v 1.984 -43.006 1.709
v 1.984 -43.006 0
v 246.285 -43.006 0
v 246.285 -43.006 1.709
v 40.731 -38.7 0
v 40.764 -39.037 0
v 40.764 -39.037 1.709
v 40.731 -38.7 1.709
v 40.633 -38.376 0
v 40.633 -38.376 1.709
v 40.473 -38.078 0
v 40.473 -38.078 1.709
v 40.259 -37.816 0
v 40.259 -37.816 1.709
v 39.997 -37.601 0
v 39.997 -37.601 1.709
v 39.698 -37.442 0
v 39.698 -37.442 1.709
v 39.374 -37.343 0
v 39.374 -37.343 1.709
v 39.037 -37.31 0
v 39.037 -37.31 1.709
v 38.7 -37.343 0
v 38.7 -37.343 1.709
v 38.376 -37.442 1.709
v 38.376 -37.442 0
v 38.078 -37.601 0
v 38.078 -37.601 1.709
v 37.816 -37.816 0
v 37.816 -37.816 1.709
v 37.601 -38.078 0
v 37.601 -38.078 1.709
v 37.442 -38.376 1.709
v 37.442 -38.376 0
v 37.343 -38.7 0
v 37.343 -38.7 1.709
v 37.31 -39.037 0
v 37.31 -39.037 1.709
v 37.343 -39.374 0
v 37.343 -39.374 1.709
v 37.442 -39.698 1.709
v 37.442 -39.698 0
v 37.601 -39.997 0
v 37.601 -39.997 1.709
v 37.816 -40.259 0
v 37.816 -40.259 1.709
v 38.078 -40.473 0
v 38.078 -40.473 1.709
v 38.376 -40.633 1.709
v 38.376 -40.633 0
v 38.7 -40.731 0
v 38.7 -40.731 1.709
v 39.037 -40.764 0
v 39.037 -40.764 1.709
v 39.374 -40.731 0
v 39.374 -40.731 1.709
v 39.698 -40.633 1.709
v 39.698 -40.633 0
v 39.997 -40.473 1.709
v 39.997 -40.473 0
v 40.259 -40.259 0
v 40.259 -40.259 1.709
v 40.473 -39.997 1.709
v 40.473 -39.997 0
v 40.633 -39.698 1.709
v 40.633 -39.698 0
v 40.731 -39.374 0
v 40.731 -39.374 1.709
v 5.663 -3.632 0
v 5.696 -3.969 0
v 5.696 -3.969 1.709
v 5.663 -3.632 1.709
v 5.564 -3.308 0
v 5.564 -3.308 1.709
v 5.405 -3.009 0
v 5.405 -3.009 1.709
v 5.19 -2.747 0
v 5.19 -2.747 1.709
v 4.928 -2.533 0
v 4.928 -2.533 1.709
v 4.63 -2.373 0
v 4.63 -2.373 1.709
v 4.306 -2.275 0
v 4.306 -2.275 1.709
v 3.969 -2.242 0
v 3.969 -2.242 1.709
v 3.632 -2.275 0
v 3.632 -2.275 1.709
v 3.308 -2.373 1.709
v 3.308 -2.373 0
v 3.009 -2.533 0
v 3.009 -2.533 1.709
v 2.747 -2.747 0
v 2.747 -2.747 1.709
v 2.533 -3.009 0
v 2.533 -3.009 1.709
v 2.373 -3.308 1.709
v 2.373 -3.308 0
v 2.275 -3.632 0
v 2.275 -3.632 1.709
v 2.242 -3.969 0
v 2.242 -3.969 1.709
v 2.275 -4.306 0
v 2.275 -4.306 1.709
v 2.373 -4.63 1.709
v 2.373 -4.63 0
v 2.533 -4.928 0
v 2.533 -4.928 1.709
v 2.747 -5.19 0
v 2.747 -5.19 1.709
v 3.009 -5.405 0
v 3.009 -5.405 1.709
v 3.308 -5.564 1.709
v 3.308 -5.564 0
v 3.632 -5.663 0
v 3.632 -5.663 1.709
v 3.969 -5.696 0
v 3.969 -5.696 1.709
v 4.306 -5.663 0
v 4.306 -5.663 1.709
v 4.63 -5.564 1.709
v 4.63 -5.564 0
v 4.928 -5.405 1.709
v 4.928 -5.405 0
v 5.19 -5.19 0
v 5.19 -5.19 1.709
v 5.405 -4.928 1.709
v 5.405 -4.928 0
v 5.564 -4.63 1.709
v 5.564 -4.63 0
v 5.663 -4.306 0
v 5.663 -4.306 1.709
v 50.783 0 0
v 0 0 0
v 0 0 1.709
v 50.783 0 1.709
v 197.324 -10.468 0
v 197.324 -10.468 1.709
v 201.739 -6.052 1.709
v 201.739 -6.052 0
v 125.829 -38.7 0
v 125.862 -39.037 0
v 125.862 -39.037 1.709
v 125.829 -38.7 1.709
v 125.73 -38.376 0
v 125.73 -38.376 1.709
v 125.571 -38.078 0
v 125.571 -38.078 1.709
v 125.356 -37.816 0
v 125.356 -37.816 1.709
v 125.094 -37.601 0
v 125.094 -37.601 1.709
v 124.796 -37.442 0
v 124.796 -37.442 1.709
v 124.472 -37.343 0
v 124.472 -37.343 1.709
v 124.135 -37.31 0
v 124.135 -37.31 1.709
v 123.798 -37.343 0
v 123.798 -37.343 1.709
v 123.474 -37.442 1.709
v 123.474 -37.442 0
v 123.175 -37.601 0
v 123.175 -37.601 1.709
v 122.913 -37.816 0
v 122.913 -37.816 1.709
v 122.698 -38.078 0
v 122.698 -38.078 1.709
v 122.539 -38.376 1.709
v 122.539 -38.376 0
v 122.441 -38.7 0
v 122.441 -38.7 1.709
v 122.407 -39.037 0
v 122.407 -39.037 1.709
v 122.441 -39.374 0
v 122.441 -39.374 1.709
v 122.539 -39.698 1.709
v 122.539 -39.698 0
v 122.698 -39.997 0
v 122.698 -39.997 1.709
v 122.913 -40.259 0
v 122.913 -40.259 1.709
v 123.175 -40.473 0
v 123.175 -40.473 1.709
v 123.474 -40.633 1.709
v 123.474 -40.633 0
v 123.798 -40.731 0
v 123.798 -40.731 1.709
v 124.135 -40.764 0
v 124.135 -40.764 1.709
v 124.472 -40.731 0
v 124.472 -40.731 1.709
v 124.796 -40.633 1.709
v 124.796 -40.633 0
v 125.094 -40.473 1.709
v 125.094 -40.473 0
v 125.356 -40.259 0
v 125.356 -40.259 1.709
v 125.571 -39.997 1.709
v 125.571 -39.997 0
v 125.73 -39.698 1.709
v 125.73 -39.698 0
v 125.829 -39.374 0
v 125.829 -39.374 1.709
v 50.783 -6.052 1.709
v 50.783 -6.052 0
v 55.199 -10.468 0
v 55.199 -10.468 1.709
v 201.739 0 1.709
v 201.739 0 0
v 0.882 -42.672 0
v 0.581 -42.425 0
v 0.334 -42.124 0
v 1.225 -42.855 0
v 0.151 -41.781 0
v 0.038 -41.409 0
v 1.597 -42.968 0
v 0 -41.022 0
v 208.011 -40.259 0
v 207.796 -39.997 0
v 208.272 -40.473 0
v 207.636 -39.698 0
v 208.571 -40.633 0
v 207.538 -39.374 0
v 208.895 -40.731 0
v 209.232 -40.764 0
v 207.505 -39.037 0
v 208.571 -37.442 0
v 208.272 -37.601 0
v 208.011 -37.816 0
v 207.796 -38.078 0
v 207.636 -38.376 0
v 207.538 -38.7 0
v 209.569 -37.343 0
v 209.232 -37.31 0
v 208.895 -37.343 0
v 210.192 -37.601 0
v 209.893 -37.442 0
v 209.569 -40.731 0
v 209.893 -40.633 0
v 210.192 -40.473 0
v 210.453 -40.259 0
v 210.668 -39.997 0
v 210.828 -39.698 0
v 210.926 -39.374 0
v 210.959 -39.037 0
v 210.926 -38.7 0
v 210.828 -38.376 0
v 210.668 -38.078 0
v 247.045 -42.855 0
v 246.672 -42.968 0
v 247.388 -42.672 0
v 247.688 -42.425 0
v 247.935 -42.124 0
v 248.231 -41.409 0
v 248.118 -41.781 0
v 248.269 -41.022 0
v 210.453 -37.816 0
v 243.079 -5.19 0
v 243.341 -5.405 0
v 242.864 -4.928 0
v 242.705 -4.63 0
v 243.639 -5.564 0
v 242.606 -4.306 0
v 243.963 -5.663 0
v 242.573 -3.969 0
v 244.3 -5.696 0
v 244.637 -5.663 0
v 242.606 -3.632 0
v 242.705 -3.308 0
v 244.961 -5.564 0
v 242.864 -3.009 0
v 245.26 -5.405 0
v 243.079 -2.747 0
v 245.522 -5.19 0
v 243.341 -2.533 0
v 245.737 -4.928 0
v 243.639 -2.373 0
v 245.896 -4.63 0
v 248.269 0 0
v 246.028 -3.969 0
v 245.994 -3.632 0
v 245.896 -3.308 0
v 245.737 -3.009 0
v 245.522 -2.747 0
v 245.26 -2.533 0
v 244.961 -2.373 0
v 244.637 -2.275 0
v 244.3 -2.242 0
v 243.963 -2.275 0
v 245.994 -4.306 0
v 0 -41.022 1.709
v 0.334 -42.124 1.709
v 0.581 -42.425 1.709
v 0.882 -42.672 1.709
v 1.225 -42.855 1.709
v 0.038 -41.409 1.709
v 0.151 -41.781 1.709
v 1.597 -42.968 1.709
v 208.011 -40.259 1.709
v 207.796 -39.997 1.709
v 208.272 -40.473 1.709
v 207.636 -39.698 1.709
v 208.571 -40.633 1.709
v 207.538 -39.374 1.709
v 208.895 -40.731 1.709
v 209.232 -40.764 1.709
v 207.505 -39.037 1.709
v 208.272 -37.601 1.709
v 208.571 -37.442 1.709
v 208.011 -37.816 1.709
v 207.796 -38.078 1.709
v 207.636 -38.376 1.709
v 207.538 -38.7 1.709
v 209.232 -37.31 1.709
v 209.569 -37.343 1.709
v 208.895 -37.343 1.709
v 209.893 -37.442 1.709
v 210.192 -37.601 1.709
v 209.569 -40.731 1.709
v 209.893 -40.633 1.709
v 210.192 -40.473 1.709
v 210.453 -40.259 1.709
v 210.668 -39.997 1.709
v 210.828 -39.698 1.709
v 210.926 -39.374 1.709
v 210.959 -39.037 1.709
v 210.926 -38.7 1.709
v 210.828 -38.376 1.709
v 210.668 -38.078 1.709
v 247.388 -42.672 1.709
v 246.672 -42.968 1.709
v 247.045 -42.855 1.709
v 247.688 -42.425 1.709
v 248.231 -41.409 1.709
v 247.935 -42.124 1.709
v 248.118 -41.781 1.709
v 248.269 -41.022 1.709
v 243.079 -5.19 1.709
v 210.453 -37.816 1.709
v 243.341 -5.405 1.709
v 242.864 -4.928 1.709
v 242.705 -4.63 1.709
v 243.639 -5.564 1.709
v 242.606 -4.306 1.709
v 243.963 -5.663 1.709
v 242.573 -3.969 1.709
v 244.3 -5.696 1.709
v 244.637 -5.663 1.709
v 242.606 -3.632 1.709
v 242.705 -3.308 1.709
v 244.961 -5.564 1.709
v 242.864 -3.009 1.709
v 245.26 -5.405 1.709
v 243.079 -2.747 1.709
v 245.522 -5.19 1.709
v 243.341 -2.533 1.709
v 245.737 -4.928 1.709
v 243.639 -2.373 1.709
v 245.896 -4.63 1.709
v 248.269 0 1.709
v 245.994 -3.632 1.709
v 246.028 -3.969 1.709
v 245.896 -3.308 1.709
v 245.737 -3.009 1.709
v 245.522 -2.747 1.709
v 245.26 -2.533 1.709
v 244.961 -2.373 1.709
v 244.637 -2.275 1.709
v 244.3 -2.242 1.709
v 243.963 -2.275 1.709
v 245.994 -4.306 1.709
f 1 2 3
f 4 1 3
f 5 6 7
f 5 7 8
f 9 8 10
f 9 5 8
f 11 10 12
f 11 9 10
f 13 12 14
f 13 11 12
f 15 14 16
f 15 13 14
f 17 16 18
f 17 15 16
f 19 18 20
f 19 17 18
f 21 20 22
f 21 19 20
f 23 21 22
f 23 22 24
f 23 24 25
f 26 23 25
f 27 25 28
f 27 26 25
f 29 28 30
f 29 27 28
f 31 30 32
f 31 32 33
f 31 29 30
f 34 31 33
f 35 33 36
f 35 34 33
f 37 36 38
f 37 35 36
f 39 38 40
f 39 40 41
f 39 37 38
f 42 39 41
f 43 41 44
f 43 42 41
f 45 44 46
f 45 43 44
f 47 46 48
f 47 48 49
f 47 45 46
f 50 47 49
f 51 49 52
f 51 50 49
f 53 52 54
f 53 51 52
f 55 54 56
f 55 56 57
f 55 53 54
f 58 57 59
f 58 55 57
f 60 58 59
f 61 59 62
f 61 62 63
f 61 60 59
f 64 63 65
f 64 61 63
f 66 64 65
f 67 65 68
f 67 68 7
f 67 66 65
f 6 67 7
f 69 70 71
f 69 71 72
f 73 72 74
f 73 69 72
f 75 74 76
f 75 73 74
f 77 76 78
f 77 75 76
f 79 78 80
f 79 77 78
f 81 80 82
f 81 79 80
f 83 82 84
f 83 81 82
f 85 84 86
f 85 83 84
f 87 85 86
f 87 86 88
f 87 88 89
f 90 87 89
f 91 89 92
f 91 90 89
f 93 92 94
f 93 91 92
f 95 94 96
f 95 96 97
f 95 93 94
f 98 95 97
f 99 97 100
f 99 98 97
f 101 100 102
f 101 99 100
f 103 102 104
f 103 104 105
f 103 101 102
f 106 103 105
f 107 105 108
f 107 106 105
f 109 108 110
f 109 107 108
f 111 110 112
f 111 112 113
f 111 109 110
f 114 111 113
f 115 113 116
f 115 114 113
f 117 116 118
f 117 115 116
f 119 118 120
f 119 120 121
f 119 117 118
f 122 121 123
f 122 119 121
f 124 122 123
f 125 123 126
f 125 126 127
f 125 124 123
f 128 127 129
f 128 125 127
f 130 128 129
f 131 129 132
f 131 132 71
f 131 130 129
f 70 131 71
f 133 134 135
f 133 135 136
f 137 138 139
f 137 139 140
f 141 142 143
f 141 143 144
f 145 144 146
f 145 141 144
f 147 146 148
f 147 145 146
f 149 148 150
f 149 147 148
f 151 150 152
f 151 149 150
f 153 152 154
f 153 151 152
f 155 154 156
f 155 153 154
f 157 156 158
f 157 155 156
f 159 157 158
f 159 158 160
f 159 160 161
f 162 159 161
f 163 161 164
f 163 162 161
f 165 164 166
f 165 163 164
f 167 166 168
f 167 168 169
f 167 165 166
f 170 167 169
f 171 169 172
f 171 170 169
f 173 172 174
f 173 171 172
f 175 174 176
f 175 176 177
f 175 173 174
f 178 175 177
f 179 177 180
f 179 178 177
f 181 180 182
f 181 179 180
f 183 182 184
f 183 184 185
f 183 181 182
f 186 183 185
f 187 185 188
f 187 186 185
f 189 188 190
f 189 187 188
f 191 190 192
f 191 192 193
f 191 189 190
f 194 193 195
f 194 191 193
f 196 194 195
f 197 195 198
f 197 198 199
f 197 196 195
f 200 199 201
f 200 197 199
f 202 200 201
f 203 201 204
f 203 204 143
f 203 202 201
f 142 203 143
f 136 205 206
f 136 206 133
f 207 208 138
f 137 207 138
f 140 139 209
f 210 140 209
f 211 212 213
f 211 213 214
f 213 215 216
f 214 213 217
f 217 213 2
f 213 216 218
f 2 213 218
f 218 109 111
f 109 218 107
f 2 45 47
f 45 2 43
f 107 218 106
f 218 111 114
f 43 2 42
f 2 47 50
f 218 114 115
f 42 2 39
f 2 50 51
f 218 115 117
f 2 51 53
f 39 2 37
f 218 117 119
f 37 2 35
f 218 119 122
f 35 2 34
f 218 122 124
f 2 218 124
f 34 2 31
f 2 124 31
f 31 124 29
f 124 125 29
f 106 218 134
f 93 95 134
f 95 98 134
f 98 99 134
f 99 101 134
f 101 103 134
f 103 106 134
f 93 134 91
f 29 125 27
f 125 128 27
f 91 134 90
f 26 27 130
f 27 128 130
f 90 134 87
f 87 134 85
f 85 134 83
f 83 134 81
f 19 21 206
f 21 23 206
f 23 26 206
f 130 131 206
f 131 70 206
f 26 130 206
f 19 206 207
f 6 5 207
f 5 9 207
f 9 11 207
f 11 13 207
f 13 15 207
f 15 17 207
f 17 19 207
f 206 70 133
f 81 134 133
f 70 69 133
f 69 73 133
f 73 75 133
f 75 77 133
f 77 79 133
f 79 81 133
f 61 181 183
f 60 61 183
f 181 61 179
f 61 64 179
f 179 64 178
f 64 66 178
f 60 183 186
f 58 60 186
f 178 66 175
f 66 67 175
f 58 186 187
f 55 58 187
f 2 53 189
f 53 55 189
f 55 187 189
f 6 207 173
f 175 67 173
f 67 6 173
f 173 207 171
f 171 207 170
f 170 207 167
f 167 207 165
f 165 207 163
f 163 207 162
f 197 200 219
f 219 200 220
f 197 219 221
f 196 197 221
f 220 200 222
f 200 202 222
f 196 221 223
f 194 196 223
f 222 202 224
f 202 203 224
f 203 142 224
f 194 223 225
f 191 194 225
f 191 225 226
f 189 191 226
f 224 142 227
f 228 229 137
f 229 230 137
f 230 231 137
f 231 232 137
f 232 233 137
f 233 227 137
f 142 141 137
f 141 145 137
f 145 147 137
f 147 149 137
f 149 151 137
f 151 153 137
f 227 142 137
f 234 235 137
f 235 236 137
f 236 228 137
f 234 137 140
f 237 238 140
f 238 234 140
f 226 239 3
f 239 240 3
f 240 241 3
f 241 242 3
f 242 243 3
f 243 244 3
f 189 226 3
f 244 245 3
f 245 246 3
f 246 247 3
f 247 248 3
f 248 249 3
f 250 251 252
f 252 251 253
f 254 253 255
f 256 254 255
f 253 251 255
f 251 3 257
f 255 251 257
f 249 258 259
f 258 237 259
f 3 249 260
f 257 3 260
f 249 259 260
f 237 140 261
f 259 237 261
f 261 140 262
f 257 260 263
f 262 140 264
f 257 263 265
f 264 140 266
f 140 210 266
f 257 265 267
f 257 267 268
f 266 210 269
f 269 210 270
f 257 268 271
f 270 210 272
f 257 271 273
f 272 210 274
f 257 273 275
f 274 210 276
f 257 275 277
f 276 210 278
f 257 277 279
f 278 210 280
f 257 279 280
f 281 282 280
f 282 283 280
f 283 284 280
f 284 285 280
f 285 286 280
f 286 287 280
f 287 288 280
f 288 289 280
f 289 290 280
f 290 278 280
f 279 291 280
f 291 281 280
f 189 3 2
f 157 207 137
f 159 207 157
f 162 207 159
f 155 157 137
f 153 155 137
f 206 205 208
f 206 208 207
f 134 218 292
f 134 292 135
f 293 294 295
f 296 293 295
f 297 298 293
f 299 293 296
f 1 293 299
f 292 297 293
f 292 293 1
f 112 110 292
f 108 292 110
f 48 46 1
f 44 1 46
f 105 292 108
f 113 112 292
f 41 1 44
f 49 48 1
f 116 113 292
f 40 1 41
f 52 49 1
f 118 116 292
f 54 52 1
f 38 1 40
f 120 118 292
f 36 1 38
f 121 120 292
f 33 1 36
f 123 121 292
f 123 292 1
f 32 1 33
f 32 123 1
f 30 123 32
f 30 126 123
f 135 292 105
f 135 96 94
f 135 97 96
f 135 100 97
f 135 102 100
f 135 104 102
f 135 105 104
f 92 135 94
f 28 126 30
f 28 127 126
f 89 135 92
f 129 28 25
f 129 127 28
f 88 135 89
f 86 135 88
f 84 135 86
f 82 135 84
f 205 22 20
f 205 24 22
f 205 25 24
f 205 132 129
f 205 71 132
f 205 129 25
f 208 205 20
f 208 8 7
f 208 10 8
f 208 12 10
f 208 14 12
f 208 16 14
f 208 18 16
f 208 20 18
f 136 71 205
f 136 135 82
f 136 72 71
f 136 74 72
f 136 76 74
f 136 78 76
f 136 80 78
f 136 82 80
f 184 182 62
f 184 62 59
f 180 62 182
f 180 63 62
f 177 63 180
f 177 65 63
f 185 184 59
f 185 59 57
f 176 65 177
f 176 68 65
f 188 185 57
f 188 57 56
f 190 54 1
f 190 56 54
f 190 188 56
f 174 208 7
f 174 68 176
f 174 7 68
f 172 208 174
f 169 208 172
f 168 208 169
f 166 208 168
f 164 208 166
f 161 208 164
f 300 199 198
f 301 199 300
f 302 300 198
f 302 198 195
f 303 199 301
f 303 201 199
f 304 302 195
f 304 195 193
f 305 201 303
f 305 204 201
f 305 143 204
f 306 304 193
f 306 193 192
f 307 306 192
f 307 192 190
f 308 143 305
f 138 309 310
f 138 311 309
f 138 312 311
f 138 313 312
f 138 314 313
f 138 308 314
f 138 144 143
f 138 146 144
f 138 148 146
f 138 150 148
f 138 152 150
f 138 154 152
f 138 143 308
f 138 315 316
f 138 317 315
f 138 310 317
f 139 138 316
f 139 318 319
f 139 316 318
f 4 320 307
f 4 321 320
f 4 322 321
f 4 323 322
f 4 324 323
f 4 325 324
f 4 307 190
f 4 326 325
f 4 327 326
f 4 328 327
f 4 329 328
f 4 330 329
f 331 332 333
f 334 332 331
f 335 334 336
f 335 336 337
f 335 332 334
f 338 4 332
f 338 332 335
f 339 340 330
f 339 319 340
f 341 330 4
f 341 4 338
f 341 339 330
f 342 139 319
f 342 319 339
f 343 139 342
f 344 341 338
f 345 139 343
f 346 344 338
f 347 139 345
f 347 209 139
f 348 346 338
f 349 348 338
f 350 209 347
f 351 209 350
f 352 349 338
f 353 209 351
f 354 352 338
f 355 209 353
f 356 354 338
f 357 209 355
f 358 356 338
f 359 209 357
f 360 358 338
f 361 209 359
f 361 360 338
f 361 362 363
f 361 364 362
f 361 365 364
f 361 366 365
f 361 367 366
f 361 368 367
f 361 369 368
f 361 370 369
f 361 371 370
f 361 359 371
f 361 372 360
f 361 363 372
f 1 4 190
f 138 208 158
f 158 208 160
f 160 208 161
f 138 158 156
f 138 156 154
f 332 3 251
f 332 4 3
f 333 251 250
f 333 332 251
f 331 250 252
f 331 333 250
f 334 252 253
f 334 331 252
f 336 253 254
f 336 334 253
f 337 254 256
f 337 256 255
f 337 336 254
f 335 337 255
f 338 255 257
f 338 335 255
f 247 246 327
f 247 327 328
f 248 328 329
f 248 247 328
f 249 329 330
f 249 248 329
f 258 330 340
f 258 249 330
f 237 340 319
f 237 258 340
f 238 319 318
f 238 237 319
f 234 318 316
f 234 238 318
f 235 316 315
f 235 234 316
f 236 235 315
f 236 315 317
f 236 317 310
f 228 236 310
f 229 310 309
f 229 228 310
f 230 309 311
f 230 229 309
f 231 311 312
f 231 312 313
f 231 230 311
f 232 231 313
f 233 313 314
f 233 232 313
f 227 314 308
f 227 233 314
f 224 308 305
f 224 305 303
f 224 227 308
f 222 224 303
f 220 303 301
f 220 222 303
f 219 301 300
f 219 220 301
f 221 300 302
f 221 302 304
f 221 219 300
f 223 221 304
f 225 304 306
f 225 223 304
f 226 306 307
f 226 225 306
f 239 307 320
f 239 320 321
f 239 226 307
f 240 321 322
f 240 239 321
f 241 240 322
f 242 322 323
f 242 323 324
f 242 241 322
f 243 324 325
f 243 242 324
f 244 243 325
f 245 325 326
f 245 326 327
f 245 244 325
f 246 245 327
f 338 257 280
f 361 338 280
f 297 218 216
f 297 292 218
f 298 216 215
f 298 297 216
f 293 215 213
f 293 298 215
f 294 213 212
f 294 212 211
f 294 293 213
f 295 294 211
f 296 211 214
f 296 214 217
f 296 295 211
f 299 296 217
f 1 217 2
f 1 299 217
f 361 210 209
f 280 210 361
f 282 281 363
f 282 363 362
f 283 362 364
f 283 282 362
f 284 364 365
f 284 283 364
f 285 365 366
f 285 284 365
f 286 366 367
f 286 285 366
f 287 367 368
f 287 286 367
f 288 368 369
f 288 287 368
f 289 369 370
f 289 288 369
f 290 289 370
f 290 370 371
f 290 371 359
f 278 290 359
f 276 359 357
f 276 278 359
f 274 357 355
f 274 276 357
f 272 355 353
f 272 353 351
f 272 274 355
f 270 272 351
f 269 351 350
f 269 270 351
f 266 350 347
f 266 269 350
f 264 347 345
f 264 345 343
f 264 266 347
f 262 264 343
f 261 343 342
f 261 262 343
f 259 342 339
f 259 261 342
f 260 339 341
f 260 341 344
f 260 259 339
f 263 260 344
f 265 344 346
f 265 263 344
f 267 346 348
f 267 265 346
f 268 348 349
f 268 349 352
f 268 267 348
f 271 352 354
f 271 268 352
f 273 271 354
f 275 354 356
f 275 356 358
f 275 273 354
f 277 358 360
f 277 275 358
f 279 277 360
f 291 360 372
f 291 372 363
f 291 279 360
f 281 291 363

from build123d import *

# Parameters (mm, degrees)
F0_W     = 248.269176
F0_H     = 43.005985
F0_R     = 1.7272
F1_DEPTH = 1.70942
F2_R     = 1.98374
F3_W     = 150.955984
F3_H     = 10.467619
F4_DEPTH = 1.70942
F5_SIZE  = 4.415511


with BuildPart() as f1:
    # F0 (on Top) → F1 (new body)
    with BuildSketch(Plane.XY):
        with Locations((124.134588, -21.502992)):
            Rectangle(F0_W, F0_H)
        with Locations((39.037235, -39.037235)):
            Circle(F0_R, mode=Mode.SUBTRACT)
        with Locations((124.134588, -39.037235)):
            Circle(F0_R, mode=Mode.SUBTRACT)
        with Locations((209.231941, -39.037235)):
            Circle(F0_R, mode=Mode.SUBTRACT)
        with Locations((3.96875, -3.96875)):
            Circle(F0_R, mode=Mode.SUBTRACT)
        with Locations((244.300426, -3.96875)):
            Circle(F0_R, mode=Mode.SUBTRACT)
    extrude(amount=F1_DEPTH)

    # F2
    f2_edges = [f1.edges().sort_by_distance(p)[0] for p in [
        (0, -43.005985, 0.85471),
        (248.269176, -43.005985, 0.85471),
    ]]
    fillet(f2_edges, radius=F2_R)

    # F3 (on face) → F4 (cut, through all)
    with BuildSketch(Plane.XY.offset(1.70942)):
        with Locations((126.261038, -5.233809)):
            Rectangle(F3_W, F3_H)
    extrude(amount=-F4_DEPTH, mode=Mode.SUBTRACT)

    # F5
    f5_edges = [f1.edges().sort_by_distance(p)[0] for p in [
        (50.783046, -10.467619, 0.85471),
        (201.73903, -10.467619, 0.85471),
    ]]
    chamfer(f5_edges, length=F5_SIZE)


solid = f1.part
